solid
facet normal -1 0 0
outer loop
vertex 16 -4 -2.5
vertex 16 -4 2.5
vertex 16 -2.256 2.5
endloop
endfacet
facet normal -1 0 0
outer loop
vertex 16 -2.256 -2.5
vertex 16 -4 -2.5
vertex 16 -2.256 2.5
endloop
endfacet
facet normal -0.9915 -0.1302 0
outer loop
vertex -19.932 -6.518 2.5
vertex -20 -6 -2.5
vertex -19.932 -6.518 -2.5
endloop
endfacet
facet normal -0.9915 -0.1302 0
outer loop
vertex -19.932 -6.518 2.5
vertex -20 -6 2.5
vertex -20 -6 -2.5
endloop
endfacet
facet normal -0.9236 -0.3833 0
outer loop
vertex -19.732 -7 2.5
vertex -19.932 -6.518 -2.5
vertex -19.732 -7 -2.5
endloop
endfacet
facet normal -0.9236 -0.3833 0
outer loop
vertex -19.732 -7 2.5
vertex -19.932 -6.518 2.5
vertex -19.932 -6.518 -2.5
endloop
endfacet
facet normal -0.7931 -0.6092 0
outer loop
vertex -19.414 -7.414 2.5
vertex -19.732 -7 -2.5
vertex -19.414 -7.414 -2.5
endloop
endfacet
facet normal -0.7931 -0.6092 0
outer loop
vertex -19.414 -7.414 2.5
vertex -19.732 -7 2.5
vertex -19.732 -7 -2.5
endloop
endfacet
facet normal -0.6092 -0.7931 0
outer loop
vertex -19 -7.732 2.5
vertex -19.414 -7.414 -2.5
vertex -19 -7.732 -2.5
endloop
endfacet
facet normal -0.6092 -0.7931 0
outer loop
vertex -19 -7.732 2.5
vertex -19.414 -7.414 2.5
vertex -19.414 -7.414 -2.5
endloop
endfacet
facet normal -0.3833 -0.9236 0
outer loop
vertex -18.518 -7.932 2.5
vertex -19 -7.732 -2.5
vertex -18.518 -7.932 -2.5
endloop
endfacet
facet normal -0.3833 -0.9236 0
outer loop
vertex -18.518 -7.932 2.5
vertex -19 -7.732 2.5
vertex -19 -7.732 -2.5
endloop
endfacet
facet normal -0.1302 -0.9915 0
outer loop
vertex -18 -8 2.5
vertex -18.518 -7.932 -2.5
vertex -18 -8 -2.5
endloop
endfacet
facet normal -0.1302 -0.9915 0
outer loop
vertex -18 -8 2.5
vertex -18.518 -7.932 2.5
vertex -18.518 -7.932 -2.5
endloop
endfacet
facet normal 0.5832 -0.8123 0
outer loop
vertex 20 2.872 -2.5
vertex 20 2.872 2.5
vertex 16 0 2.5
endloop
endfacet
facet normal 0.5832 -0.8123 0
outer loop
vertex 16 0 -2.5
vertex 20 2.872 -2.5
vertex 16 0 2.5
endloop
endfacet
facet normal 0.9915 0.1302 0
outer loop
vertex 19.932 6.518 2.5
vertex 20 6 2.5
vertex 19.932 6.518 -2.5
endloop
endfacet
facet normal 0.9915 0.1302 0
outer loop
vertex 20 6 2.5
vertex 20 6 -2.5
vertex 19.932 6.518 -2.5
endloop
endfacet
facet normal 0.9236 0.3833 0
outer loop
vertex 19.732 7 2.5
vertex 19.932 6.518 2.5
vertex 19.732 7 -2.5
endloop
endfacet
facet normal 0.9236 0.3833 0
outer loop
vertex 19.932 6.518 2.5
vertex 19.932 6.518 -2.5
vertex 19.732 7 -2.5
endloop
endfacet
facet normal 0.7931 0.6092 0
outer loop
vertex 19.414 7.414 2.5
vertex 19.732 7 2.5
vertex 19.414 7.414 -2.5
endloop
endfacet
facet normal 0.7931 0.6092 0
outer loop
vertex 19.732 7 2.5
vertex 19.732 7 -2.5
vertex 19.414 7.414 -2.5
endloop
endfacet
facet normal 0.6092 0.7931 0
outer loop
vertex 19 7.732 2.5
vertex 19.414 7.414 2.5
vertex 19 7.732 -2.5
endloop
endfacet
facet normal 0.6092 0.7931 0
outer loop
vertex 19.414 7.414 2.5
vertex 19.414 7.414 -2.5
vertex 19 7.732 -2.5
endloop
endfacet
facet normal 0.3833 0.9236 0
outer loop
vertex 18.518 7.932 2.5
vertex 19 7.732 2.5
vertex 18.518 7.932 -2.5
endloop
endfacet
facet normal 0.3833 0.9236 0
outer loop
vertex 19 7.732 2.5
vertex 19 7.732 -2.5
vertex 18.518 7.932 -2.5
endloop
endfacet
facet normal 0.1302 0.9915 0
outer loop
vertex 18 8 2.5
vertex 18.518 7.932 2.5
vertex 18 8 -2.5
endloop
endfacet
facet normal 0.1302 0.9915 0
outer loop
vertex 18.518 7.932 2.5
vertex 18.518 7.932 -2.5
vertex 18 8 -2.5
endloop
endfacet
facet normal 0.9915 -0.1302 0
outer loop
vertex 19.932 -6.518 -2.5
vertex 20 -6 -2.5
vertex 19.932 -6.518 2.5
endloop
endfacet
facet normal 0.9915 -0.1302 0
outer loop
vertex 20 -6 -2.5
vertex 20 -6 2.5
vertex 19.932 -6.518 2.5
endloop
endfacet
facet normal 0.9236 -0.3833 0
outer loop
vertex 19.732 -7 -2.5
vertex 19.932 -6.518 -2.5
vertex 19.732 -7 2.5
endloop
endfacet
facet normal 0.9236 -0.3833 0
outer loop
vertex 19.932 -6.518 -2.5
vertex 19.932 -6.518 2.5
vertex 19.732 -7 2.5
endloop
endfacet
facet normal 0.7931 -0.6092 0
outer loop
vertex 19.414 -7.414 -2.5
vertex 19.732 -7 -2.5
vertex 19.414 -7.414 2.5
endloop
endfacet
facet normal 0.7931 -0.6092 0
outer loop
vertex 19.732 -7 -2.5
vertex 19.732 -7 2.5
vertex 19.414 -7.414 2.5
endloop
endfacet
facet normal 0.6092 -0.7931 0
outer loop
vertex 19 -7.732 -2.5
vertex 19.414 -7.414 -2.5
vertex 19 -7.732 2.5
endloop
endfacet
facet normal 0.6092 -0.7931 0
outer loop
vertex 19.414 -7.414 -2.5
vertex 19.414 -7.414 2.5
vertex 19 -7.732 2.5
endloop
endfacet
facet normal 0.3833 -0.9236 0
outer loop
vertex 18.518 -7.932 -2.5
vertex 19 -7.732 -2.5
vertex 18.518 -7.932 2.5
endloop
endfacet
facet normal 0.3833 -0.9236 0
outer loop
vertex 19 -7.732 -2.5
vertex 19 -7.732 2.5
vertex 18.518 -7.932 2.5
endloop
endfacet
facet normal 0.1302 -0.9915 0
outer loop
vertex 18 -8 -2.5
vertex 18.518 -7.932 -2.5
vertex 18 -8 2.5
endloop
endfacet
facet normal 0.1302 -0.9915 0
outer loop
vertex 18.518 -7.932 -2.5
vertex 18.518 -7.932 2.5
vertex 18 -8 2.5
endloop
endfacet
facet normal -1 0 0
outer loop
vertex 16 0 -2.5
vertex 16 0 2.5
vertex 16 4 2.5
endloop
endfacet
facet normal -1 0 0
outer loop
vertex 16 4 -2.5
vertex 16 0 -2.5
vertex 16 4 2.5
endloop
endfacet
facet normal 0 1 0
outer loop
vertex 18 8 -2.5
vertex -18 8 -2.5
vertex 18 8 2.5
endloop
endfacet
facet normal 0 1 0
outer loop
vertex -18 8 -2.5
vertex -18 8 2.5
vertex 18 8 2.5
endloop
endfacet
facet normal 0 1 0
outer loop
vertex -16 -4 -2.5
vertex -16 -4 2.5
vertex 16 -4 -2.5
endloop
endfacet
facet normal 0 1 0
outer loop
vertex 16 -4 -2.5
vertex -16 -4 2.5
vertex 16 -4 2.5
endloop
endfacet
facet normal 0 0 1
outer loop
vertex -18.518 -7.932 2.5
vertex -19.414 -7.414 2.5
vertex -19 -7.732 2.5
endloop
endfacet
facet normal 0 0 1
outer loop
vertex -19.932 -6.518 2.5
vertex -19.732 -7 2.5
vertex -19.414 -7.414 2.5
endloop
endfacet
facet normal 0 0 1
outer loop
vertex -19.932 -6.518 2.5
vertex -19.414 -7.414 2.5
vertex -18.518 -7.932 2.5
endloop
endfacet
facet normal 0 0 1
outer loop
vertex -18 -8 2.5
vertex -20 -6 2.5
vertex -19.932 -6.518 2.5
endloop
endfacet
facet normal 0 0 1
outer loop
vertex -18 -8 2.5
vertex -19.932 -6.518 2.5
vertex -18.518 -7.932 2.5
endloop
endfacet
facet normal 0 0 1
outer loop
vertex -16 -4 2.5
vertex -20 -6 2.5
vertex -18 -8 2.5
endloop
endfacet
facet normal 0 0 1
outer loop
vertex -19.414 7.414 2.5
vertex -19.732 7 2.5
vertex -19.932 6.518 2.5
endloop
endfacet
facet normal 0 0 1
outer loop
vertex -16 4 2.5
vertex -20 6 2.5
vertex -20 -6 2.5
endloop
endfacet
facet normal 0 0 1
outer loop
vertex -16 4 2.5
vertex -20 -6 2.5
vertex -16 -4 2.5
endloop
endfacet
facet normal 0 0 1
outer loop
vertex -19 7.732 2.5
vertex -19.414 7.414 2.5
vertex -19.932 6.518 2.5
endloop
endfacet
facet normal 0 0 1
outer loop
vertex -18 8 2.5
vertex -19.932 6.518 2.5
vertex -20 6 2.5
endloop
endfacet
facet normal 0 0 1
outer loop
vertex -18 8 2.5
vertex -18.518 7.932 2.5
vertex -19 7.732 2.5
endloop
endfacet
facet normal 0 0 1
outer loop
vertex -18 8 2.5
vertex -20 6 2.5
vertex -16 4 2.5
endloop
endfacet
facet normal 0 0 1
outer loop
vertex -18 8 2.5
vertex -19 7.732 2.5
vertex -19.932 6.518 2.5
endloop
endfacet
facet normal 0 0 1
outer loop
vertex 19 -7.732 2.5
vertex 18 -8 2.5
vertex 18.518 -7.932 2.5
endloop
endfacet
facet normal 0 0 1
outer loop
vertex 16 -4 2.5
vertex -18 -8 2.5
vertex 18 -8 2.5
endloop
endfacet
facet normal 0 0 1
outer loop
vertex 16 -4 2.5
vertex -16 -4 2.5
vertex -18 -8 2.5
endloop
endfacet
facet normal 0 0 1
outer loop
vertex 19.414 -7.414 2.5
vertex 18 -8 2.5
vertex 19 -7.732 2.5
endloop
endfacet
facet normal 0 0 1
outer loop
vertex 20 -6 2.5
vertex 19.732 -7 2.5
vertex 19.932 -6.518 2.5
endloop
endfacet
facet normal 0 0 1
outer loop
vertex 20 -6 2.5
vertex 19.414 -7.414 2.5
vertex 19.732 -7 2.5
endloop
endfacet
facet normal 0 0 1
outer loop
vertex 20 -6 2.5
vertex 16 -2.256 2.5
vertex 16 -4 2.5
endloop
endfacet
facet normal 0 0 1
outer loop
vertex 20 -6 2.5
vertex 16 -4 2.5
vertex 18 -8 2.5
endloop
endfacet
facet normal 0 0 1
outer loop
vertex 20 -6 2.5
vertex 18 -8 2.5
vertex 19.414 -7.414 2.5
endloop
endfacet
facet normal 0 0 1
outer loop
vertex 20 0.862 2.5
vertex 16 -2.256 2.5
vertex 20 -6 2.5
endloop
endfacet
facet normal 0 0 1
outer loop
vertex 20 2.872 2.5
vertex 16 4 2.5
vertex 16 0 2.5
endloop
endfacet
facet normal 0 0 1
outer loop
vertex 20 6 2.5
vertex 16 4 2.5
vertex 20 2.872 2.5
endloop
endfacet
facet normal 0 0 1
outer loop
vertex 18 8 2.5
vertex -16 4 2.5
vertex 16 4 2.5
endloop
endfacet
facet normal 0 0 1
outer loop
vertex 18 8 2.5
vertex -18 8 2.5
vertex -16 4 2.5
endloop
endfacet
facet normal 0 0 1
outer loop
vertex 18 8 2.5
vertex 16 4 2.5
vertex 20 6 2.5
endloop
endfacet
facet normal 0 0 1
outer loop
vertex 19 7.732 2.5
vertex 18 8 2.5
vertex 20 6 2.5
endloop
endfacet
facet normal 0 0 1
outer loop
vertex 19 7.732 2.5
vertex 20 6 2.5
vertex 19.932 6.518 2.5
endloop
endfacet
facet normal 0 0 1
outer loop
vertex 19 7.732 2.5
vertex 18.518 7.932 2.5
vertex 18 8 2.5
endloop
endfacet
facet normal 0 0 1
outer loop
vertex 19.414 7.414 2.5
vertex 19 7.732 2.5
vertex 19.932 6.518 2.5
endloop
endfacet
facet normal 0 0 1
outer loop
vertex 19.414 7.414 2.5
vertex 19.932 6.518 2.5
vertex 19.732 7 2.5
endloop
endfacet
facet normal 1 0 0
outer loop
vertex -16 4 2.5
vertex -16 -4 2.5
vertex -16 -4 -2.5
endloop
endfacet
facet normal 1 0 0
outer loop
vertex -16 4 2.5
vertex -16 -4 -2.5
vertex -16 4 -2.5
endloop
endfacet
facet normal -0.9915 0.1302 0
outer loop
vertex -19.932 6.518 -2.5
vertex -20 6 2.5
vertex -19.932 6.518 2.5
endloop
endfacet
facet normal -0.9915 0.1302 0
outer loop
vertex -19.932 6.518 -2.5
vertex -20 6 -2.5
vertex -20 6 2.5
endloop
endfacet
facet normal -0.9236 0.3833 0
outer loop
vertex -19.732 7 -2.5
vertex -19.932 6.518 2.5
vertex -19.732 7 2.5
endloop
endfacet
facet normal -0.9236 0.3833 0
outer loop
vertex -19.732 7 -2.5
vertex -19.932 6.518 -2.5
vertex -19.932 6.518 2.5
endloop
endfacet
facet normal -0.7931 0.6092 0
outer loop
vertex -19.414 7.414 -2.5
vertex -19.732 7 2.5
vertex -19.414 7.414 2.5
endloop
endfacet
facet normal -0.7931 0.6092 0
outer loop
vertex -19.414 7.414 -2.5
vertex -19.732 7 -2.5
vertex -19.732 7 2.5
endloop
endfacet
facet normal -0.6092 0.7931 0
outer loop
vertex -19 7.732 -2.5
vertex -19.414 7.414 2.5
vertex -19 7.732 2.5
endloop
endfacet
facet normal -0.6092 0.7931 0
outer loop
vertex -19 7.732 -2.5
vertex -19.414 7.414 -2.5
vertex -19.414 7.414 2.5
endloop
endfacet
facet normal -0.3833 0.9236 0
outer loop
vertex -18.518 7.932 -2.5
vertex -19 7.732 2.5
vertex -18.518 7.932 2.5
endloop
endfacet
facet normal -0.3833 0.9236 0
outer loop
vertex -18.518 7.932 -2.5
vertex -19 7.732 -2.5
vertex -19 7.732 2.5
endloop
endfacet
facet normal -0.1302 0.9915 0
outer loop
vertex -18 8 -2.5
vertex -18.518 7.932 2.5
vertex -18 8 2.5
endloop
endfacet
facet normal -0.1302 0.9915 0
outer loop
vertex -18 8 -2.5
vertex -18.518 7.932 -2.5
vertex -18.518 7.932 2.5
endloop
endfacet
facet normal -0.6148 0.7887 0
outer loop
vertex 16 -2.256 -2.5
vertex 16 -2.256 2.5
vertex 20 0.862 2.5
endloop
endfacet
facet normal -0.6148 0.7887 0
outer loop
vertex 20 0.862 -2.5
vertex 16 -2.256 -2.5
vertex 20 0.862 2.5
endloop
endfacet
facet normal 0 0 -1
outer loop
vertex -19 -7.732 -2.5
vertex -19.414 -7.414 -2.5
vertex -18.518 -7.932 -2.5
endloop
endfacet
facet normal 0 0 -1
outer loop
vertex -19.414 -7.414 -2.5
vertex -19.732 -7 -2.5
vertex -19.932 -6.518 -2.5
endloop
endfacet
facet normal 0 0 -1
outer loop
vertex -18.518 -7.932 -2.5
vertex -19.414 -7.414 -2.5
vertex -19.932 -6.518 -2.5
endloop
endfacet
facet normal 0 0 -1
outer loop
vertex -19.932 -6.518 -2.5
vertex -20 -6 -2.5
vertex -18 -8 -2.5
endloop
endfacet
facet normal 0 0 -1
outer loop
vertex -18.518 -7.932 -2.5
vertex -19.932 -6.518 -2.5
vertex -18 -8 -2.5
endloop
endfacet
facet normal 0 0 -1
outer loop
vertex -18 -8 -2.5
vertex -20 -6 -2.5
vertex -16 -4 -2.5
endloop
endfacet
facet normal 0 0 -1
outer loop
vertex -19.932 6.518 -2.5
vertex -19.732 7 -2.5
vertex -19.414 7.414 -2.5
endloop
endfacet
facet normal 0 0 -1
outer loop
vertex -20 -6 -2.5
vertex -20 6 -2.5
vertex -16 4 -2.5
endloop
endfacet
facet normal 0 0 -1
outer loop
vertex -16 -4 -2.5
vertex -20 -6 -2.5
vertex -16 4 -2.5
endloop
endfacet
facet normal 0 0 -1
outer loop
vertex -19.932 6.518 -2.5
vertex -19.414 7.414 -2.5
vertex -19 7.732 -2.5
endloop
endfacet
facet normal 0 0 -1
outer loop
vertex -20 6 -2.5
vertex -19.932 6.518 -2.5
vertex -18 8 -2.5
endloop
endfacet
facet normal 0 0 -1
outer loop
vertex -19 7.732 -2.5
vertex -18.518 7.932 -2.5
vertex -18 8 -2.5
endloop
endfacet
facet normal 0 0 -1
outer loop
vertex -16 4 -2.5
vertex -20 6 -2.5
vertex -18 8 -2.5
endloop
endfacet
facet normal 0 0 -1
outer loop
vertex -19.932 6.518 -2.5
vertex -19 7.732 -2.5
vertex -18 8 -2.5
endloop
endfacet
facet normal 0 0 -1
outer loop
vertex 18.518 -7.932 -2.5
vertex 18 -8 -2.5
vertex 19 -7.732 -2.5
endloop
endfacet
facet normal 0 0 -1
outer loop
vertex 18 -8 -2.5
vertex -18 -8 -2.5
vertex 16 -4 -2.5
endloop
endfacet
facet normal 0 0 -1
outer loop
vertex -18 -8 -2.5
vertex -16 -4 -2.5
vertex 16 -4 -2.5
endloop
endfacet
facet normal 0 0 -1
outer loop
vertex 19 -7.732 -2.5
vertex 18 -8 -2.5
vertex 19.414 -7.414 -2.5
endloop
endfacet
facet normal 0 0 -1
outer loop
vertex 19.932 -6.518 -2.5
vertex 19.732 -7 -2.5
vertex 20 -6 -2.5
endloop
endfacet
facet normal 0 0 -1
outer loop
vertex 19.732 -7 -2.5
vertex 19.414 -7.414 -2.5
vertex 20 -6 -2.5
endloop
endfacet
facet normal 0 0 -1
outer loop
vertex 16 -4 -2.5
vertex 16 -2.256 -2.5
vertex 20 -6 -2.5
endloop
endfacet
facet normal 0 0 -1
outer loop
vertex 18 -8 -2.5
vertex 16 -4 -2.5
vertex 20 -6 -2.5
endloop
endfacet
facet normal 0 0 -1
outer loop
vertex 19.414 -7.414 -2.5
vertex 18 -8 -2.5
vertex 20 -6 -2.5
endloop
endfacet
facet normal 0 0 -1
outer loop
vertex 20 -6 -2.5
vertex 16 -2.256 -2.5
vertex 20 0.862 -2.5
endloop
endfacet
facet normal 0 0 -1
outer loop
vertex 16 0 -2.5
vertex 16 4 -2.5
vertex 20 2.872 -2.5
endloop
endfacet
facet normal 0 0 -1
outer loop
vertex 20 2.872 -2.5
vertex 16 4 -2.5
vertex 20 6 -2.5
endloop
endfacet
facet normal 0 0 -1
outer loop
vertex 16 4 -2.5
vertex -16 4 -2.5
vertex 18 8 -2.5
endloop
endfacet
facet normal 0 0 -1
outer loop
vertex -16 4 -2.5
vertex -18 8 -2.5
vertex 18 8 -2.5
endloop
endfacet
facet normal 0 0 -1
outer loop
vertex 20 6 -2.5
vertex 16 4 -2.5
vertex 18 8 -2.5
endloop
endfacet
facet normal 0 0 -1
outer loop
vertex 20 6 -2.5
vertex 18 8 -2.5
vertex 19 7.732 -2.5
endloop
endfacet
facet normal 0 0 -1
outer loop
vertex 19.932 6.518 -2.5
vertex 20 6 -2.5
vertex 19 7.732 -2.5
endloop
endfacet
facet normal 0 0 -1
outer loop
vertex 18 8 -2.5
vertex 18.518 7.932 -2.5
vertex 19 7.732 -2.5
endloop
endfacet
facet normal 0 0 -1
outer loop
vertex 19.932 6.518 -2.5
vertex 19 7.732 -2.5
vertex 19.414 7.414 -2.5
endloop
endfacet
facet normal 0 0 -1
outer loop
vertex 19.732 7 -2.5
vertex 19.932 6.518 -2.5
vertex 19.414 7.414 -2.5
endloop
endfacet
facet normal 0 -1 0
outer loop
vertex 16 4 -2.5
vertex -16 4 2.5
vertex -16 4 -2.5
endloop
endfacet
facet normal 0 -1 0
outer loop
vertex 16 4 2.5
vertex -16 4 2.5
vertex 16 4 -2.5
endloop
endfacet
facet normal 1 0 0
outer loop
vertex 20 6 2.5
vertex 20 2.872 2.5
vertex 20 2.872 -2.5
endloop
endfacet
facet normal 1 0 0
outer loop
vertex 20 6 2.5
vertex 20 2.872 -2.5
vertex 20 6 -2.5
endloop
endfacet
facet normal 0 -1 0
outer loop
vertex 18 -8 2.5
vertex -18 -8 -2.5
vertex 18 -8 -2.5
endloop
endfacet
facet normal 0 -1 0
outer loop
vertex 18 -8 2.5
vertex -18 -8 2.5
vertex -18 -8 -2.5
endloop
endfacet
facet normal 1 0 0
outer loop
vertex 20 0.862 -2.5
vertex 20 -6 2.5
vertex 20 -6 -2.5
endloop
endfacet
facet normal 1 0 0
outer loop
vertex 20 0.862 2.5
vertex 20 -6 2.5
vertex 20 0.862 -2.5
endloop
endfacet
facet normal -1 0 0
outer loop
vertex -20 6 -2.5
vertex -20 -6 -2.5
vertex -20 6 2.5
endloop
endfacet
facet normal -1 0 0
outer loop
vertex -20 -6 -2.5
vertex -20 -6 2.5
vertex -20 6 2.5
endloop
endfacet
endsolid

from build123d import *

# Parameters (mm, degrees)
F0_W     = 40
F0_H     = 16
F0_W_2   = 32
F0_H_2   = 8
F1_DEPTH = 2.5
F2_R     = 2
F4_DEPTH = 12.5


with BuildPart() as f1:
    # F0 (on Top) → F1 (new body, symmetric)
    with BuildSketch(Plane.XY):
        Rectangle(F0_W, F0_H)
        Rectangle(F0_W_2, F0_H_2, mode=Mode.SUBTRACT)
    extrude(amount=F1_DEPTH, both=True)

    # F2
    f2_edges = [f1.edges().sort_by_distance(p)[0] for p in [
        (-20, 8, 0),
        (-20, -8, 0),
        (20, -8, 0),
        (20, 8, 0),
    ]]
    fillet(f2_edges, radius=F2_R)

    # F3 (on face) → F4 (cut, symmetric)
    with BuildSketch(Plane.XY.offset(2.5)):
        Polygon((16, 0), (16, -2.256422), (20, 0.861545), (20, 2.871813), align=None)
    extrude(amount=F4_DEPTH, both=True, mode=Mode.SUBTRACT)


solid = f1.part
